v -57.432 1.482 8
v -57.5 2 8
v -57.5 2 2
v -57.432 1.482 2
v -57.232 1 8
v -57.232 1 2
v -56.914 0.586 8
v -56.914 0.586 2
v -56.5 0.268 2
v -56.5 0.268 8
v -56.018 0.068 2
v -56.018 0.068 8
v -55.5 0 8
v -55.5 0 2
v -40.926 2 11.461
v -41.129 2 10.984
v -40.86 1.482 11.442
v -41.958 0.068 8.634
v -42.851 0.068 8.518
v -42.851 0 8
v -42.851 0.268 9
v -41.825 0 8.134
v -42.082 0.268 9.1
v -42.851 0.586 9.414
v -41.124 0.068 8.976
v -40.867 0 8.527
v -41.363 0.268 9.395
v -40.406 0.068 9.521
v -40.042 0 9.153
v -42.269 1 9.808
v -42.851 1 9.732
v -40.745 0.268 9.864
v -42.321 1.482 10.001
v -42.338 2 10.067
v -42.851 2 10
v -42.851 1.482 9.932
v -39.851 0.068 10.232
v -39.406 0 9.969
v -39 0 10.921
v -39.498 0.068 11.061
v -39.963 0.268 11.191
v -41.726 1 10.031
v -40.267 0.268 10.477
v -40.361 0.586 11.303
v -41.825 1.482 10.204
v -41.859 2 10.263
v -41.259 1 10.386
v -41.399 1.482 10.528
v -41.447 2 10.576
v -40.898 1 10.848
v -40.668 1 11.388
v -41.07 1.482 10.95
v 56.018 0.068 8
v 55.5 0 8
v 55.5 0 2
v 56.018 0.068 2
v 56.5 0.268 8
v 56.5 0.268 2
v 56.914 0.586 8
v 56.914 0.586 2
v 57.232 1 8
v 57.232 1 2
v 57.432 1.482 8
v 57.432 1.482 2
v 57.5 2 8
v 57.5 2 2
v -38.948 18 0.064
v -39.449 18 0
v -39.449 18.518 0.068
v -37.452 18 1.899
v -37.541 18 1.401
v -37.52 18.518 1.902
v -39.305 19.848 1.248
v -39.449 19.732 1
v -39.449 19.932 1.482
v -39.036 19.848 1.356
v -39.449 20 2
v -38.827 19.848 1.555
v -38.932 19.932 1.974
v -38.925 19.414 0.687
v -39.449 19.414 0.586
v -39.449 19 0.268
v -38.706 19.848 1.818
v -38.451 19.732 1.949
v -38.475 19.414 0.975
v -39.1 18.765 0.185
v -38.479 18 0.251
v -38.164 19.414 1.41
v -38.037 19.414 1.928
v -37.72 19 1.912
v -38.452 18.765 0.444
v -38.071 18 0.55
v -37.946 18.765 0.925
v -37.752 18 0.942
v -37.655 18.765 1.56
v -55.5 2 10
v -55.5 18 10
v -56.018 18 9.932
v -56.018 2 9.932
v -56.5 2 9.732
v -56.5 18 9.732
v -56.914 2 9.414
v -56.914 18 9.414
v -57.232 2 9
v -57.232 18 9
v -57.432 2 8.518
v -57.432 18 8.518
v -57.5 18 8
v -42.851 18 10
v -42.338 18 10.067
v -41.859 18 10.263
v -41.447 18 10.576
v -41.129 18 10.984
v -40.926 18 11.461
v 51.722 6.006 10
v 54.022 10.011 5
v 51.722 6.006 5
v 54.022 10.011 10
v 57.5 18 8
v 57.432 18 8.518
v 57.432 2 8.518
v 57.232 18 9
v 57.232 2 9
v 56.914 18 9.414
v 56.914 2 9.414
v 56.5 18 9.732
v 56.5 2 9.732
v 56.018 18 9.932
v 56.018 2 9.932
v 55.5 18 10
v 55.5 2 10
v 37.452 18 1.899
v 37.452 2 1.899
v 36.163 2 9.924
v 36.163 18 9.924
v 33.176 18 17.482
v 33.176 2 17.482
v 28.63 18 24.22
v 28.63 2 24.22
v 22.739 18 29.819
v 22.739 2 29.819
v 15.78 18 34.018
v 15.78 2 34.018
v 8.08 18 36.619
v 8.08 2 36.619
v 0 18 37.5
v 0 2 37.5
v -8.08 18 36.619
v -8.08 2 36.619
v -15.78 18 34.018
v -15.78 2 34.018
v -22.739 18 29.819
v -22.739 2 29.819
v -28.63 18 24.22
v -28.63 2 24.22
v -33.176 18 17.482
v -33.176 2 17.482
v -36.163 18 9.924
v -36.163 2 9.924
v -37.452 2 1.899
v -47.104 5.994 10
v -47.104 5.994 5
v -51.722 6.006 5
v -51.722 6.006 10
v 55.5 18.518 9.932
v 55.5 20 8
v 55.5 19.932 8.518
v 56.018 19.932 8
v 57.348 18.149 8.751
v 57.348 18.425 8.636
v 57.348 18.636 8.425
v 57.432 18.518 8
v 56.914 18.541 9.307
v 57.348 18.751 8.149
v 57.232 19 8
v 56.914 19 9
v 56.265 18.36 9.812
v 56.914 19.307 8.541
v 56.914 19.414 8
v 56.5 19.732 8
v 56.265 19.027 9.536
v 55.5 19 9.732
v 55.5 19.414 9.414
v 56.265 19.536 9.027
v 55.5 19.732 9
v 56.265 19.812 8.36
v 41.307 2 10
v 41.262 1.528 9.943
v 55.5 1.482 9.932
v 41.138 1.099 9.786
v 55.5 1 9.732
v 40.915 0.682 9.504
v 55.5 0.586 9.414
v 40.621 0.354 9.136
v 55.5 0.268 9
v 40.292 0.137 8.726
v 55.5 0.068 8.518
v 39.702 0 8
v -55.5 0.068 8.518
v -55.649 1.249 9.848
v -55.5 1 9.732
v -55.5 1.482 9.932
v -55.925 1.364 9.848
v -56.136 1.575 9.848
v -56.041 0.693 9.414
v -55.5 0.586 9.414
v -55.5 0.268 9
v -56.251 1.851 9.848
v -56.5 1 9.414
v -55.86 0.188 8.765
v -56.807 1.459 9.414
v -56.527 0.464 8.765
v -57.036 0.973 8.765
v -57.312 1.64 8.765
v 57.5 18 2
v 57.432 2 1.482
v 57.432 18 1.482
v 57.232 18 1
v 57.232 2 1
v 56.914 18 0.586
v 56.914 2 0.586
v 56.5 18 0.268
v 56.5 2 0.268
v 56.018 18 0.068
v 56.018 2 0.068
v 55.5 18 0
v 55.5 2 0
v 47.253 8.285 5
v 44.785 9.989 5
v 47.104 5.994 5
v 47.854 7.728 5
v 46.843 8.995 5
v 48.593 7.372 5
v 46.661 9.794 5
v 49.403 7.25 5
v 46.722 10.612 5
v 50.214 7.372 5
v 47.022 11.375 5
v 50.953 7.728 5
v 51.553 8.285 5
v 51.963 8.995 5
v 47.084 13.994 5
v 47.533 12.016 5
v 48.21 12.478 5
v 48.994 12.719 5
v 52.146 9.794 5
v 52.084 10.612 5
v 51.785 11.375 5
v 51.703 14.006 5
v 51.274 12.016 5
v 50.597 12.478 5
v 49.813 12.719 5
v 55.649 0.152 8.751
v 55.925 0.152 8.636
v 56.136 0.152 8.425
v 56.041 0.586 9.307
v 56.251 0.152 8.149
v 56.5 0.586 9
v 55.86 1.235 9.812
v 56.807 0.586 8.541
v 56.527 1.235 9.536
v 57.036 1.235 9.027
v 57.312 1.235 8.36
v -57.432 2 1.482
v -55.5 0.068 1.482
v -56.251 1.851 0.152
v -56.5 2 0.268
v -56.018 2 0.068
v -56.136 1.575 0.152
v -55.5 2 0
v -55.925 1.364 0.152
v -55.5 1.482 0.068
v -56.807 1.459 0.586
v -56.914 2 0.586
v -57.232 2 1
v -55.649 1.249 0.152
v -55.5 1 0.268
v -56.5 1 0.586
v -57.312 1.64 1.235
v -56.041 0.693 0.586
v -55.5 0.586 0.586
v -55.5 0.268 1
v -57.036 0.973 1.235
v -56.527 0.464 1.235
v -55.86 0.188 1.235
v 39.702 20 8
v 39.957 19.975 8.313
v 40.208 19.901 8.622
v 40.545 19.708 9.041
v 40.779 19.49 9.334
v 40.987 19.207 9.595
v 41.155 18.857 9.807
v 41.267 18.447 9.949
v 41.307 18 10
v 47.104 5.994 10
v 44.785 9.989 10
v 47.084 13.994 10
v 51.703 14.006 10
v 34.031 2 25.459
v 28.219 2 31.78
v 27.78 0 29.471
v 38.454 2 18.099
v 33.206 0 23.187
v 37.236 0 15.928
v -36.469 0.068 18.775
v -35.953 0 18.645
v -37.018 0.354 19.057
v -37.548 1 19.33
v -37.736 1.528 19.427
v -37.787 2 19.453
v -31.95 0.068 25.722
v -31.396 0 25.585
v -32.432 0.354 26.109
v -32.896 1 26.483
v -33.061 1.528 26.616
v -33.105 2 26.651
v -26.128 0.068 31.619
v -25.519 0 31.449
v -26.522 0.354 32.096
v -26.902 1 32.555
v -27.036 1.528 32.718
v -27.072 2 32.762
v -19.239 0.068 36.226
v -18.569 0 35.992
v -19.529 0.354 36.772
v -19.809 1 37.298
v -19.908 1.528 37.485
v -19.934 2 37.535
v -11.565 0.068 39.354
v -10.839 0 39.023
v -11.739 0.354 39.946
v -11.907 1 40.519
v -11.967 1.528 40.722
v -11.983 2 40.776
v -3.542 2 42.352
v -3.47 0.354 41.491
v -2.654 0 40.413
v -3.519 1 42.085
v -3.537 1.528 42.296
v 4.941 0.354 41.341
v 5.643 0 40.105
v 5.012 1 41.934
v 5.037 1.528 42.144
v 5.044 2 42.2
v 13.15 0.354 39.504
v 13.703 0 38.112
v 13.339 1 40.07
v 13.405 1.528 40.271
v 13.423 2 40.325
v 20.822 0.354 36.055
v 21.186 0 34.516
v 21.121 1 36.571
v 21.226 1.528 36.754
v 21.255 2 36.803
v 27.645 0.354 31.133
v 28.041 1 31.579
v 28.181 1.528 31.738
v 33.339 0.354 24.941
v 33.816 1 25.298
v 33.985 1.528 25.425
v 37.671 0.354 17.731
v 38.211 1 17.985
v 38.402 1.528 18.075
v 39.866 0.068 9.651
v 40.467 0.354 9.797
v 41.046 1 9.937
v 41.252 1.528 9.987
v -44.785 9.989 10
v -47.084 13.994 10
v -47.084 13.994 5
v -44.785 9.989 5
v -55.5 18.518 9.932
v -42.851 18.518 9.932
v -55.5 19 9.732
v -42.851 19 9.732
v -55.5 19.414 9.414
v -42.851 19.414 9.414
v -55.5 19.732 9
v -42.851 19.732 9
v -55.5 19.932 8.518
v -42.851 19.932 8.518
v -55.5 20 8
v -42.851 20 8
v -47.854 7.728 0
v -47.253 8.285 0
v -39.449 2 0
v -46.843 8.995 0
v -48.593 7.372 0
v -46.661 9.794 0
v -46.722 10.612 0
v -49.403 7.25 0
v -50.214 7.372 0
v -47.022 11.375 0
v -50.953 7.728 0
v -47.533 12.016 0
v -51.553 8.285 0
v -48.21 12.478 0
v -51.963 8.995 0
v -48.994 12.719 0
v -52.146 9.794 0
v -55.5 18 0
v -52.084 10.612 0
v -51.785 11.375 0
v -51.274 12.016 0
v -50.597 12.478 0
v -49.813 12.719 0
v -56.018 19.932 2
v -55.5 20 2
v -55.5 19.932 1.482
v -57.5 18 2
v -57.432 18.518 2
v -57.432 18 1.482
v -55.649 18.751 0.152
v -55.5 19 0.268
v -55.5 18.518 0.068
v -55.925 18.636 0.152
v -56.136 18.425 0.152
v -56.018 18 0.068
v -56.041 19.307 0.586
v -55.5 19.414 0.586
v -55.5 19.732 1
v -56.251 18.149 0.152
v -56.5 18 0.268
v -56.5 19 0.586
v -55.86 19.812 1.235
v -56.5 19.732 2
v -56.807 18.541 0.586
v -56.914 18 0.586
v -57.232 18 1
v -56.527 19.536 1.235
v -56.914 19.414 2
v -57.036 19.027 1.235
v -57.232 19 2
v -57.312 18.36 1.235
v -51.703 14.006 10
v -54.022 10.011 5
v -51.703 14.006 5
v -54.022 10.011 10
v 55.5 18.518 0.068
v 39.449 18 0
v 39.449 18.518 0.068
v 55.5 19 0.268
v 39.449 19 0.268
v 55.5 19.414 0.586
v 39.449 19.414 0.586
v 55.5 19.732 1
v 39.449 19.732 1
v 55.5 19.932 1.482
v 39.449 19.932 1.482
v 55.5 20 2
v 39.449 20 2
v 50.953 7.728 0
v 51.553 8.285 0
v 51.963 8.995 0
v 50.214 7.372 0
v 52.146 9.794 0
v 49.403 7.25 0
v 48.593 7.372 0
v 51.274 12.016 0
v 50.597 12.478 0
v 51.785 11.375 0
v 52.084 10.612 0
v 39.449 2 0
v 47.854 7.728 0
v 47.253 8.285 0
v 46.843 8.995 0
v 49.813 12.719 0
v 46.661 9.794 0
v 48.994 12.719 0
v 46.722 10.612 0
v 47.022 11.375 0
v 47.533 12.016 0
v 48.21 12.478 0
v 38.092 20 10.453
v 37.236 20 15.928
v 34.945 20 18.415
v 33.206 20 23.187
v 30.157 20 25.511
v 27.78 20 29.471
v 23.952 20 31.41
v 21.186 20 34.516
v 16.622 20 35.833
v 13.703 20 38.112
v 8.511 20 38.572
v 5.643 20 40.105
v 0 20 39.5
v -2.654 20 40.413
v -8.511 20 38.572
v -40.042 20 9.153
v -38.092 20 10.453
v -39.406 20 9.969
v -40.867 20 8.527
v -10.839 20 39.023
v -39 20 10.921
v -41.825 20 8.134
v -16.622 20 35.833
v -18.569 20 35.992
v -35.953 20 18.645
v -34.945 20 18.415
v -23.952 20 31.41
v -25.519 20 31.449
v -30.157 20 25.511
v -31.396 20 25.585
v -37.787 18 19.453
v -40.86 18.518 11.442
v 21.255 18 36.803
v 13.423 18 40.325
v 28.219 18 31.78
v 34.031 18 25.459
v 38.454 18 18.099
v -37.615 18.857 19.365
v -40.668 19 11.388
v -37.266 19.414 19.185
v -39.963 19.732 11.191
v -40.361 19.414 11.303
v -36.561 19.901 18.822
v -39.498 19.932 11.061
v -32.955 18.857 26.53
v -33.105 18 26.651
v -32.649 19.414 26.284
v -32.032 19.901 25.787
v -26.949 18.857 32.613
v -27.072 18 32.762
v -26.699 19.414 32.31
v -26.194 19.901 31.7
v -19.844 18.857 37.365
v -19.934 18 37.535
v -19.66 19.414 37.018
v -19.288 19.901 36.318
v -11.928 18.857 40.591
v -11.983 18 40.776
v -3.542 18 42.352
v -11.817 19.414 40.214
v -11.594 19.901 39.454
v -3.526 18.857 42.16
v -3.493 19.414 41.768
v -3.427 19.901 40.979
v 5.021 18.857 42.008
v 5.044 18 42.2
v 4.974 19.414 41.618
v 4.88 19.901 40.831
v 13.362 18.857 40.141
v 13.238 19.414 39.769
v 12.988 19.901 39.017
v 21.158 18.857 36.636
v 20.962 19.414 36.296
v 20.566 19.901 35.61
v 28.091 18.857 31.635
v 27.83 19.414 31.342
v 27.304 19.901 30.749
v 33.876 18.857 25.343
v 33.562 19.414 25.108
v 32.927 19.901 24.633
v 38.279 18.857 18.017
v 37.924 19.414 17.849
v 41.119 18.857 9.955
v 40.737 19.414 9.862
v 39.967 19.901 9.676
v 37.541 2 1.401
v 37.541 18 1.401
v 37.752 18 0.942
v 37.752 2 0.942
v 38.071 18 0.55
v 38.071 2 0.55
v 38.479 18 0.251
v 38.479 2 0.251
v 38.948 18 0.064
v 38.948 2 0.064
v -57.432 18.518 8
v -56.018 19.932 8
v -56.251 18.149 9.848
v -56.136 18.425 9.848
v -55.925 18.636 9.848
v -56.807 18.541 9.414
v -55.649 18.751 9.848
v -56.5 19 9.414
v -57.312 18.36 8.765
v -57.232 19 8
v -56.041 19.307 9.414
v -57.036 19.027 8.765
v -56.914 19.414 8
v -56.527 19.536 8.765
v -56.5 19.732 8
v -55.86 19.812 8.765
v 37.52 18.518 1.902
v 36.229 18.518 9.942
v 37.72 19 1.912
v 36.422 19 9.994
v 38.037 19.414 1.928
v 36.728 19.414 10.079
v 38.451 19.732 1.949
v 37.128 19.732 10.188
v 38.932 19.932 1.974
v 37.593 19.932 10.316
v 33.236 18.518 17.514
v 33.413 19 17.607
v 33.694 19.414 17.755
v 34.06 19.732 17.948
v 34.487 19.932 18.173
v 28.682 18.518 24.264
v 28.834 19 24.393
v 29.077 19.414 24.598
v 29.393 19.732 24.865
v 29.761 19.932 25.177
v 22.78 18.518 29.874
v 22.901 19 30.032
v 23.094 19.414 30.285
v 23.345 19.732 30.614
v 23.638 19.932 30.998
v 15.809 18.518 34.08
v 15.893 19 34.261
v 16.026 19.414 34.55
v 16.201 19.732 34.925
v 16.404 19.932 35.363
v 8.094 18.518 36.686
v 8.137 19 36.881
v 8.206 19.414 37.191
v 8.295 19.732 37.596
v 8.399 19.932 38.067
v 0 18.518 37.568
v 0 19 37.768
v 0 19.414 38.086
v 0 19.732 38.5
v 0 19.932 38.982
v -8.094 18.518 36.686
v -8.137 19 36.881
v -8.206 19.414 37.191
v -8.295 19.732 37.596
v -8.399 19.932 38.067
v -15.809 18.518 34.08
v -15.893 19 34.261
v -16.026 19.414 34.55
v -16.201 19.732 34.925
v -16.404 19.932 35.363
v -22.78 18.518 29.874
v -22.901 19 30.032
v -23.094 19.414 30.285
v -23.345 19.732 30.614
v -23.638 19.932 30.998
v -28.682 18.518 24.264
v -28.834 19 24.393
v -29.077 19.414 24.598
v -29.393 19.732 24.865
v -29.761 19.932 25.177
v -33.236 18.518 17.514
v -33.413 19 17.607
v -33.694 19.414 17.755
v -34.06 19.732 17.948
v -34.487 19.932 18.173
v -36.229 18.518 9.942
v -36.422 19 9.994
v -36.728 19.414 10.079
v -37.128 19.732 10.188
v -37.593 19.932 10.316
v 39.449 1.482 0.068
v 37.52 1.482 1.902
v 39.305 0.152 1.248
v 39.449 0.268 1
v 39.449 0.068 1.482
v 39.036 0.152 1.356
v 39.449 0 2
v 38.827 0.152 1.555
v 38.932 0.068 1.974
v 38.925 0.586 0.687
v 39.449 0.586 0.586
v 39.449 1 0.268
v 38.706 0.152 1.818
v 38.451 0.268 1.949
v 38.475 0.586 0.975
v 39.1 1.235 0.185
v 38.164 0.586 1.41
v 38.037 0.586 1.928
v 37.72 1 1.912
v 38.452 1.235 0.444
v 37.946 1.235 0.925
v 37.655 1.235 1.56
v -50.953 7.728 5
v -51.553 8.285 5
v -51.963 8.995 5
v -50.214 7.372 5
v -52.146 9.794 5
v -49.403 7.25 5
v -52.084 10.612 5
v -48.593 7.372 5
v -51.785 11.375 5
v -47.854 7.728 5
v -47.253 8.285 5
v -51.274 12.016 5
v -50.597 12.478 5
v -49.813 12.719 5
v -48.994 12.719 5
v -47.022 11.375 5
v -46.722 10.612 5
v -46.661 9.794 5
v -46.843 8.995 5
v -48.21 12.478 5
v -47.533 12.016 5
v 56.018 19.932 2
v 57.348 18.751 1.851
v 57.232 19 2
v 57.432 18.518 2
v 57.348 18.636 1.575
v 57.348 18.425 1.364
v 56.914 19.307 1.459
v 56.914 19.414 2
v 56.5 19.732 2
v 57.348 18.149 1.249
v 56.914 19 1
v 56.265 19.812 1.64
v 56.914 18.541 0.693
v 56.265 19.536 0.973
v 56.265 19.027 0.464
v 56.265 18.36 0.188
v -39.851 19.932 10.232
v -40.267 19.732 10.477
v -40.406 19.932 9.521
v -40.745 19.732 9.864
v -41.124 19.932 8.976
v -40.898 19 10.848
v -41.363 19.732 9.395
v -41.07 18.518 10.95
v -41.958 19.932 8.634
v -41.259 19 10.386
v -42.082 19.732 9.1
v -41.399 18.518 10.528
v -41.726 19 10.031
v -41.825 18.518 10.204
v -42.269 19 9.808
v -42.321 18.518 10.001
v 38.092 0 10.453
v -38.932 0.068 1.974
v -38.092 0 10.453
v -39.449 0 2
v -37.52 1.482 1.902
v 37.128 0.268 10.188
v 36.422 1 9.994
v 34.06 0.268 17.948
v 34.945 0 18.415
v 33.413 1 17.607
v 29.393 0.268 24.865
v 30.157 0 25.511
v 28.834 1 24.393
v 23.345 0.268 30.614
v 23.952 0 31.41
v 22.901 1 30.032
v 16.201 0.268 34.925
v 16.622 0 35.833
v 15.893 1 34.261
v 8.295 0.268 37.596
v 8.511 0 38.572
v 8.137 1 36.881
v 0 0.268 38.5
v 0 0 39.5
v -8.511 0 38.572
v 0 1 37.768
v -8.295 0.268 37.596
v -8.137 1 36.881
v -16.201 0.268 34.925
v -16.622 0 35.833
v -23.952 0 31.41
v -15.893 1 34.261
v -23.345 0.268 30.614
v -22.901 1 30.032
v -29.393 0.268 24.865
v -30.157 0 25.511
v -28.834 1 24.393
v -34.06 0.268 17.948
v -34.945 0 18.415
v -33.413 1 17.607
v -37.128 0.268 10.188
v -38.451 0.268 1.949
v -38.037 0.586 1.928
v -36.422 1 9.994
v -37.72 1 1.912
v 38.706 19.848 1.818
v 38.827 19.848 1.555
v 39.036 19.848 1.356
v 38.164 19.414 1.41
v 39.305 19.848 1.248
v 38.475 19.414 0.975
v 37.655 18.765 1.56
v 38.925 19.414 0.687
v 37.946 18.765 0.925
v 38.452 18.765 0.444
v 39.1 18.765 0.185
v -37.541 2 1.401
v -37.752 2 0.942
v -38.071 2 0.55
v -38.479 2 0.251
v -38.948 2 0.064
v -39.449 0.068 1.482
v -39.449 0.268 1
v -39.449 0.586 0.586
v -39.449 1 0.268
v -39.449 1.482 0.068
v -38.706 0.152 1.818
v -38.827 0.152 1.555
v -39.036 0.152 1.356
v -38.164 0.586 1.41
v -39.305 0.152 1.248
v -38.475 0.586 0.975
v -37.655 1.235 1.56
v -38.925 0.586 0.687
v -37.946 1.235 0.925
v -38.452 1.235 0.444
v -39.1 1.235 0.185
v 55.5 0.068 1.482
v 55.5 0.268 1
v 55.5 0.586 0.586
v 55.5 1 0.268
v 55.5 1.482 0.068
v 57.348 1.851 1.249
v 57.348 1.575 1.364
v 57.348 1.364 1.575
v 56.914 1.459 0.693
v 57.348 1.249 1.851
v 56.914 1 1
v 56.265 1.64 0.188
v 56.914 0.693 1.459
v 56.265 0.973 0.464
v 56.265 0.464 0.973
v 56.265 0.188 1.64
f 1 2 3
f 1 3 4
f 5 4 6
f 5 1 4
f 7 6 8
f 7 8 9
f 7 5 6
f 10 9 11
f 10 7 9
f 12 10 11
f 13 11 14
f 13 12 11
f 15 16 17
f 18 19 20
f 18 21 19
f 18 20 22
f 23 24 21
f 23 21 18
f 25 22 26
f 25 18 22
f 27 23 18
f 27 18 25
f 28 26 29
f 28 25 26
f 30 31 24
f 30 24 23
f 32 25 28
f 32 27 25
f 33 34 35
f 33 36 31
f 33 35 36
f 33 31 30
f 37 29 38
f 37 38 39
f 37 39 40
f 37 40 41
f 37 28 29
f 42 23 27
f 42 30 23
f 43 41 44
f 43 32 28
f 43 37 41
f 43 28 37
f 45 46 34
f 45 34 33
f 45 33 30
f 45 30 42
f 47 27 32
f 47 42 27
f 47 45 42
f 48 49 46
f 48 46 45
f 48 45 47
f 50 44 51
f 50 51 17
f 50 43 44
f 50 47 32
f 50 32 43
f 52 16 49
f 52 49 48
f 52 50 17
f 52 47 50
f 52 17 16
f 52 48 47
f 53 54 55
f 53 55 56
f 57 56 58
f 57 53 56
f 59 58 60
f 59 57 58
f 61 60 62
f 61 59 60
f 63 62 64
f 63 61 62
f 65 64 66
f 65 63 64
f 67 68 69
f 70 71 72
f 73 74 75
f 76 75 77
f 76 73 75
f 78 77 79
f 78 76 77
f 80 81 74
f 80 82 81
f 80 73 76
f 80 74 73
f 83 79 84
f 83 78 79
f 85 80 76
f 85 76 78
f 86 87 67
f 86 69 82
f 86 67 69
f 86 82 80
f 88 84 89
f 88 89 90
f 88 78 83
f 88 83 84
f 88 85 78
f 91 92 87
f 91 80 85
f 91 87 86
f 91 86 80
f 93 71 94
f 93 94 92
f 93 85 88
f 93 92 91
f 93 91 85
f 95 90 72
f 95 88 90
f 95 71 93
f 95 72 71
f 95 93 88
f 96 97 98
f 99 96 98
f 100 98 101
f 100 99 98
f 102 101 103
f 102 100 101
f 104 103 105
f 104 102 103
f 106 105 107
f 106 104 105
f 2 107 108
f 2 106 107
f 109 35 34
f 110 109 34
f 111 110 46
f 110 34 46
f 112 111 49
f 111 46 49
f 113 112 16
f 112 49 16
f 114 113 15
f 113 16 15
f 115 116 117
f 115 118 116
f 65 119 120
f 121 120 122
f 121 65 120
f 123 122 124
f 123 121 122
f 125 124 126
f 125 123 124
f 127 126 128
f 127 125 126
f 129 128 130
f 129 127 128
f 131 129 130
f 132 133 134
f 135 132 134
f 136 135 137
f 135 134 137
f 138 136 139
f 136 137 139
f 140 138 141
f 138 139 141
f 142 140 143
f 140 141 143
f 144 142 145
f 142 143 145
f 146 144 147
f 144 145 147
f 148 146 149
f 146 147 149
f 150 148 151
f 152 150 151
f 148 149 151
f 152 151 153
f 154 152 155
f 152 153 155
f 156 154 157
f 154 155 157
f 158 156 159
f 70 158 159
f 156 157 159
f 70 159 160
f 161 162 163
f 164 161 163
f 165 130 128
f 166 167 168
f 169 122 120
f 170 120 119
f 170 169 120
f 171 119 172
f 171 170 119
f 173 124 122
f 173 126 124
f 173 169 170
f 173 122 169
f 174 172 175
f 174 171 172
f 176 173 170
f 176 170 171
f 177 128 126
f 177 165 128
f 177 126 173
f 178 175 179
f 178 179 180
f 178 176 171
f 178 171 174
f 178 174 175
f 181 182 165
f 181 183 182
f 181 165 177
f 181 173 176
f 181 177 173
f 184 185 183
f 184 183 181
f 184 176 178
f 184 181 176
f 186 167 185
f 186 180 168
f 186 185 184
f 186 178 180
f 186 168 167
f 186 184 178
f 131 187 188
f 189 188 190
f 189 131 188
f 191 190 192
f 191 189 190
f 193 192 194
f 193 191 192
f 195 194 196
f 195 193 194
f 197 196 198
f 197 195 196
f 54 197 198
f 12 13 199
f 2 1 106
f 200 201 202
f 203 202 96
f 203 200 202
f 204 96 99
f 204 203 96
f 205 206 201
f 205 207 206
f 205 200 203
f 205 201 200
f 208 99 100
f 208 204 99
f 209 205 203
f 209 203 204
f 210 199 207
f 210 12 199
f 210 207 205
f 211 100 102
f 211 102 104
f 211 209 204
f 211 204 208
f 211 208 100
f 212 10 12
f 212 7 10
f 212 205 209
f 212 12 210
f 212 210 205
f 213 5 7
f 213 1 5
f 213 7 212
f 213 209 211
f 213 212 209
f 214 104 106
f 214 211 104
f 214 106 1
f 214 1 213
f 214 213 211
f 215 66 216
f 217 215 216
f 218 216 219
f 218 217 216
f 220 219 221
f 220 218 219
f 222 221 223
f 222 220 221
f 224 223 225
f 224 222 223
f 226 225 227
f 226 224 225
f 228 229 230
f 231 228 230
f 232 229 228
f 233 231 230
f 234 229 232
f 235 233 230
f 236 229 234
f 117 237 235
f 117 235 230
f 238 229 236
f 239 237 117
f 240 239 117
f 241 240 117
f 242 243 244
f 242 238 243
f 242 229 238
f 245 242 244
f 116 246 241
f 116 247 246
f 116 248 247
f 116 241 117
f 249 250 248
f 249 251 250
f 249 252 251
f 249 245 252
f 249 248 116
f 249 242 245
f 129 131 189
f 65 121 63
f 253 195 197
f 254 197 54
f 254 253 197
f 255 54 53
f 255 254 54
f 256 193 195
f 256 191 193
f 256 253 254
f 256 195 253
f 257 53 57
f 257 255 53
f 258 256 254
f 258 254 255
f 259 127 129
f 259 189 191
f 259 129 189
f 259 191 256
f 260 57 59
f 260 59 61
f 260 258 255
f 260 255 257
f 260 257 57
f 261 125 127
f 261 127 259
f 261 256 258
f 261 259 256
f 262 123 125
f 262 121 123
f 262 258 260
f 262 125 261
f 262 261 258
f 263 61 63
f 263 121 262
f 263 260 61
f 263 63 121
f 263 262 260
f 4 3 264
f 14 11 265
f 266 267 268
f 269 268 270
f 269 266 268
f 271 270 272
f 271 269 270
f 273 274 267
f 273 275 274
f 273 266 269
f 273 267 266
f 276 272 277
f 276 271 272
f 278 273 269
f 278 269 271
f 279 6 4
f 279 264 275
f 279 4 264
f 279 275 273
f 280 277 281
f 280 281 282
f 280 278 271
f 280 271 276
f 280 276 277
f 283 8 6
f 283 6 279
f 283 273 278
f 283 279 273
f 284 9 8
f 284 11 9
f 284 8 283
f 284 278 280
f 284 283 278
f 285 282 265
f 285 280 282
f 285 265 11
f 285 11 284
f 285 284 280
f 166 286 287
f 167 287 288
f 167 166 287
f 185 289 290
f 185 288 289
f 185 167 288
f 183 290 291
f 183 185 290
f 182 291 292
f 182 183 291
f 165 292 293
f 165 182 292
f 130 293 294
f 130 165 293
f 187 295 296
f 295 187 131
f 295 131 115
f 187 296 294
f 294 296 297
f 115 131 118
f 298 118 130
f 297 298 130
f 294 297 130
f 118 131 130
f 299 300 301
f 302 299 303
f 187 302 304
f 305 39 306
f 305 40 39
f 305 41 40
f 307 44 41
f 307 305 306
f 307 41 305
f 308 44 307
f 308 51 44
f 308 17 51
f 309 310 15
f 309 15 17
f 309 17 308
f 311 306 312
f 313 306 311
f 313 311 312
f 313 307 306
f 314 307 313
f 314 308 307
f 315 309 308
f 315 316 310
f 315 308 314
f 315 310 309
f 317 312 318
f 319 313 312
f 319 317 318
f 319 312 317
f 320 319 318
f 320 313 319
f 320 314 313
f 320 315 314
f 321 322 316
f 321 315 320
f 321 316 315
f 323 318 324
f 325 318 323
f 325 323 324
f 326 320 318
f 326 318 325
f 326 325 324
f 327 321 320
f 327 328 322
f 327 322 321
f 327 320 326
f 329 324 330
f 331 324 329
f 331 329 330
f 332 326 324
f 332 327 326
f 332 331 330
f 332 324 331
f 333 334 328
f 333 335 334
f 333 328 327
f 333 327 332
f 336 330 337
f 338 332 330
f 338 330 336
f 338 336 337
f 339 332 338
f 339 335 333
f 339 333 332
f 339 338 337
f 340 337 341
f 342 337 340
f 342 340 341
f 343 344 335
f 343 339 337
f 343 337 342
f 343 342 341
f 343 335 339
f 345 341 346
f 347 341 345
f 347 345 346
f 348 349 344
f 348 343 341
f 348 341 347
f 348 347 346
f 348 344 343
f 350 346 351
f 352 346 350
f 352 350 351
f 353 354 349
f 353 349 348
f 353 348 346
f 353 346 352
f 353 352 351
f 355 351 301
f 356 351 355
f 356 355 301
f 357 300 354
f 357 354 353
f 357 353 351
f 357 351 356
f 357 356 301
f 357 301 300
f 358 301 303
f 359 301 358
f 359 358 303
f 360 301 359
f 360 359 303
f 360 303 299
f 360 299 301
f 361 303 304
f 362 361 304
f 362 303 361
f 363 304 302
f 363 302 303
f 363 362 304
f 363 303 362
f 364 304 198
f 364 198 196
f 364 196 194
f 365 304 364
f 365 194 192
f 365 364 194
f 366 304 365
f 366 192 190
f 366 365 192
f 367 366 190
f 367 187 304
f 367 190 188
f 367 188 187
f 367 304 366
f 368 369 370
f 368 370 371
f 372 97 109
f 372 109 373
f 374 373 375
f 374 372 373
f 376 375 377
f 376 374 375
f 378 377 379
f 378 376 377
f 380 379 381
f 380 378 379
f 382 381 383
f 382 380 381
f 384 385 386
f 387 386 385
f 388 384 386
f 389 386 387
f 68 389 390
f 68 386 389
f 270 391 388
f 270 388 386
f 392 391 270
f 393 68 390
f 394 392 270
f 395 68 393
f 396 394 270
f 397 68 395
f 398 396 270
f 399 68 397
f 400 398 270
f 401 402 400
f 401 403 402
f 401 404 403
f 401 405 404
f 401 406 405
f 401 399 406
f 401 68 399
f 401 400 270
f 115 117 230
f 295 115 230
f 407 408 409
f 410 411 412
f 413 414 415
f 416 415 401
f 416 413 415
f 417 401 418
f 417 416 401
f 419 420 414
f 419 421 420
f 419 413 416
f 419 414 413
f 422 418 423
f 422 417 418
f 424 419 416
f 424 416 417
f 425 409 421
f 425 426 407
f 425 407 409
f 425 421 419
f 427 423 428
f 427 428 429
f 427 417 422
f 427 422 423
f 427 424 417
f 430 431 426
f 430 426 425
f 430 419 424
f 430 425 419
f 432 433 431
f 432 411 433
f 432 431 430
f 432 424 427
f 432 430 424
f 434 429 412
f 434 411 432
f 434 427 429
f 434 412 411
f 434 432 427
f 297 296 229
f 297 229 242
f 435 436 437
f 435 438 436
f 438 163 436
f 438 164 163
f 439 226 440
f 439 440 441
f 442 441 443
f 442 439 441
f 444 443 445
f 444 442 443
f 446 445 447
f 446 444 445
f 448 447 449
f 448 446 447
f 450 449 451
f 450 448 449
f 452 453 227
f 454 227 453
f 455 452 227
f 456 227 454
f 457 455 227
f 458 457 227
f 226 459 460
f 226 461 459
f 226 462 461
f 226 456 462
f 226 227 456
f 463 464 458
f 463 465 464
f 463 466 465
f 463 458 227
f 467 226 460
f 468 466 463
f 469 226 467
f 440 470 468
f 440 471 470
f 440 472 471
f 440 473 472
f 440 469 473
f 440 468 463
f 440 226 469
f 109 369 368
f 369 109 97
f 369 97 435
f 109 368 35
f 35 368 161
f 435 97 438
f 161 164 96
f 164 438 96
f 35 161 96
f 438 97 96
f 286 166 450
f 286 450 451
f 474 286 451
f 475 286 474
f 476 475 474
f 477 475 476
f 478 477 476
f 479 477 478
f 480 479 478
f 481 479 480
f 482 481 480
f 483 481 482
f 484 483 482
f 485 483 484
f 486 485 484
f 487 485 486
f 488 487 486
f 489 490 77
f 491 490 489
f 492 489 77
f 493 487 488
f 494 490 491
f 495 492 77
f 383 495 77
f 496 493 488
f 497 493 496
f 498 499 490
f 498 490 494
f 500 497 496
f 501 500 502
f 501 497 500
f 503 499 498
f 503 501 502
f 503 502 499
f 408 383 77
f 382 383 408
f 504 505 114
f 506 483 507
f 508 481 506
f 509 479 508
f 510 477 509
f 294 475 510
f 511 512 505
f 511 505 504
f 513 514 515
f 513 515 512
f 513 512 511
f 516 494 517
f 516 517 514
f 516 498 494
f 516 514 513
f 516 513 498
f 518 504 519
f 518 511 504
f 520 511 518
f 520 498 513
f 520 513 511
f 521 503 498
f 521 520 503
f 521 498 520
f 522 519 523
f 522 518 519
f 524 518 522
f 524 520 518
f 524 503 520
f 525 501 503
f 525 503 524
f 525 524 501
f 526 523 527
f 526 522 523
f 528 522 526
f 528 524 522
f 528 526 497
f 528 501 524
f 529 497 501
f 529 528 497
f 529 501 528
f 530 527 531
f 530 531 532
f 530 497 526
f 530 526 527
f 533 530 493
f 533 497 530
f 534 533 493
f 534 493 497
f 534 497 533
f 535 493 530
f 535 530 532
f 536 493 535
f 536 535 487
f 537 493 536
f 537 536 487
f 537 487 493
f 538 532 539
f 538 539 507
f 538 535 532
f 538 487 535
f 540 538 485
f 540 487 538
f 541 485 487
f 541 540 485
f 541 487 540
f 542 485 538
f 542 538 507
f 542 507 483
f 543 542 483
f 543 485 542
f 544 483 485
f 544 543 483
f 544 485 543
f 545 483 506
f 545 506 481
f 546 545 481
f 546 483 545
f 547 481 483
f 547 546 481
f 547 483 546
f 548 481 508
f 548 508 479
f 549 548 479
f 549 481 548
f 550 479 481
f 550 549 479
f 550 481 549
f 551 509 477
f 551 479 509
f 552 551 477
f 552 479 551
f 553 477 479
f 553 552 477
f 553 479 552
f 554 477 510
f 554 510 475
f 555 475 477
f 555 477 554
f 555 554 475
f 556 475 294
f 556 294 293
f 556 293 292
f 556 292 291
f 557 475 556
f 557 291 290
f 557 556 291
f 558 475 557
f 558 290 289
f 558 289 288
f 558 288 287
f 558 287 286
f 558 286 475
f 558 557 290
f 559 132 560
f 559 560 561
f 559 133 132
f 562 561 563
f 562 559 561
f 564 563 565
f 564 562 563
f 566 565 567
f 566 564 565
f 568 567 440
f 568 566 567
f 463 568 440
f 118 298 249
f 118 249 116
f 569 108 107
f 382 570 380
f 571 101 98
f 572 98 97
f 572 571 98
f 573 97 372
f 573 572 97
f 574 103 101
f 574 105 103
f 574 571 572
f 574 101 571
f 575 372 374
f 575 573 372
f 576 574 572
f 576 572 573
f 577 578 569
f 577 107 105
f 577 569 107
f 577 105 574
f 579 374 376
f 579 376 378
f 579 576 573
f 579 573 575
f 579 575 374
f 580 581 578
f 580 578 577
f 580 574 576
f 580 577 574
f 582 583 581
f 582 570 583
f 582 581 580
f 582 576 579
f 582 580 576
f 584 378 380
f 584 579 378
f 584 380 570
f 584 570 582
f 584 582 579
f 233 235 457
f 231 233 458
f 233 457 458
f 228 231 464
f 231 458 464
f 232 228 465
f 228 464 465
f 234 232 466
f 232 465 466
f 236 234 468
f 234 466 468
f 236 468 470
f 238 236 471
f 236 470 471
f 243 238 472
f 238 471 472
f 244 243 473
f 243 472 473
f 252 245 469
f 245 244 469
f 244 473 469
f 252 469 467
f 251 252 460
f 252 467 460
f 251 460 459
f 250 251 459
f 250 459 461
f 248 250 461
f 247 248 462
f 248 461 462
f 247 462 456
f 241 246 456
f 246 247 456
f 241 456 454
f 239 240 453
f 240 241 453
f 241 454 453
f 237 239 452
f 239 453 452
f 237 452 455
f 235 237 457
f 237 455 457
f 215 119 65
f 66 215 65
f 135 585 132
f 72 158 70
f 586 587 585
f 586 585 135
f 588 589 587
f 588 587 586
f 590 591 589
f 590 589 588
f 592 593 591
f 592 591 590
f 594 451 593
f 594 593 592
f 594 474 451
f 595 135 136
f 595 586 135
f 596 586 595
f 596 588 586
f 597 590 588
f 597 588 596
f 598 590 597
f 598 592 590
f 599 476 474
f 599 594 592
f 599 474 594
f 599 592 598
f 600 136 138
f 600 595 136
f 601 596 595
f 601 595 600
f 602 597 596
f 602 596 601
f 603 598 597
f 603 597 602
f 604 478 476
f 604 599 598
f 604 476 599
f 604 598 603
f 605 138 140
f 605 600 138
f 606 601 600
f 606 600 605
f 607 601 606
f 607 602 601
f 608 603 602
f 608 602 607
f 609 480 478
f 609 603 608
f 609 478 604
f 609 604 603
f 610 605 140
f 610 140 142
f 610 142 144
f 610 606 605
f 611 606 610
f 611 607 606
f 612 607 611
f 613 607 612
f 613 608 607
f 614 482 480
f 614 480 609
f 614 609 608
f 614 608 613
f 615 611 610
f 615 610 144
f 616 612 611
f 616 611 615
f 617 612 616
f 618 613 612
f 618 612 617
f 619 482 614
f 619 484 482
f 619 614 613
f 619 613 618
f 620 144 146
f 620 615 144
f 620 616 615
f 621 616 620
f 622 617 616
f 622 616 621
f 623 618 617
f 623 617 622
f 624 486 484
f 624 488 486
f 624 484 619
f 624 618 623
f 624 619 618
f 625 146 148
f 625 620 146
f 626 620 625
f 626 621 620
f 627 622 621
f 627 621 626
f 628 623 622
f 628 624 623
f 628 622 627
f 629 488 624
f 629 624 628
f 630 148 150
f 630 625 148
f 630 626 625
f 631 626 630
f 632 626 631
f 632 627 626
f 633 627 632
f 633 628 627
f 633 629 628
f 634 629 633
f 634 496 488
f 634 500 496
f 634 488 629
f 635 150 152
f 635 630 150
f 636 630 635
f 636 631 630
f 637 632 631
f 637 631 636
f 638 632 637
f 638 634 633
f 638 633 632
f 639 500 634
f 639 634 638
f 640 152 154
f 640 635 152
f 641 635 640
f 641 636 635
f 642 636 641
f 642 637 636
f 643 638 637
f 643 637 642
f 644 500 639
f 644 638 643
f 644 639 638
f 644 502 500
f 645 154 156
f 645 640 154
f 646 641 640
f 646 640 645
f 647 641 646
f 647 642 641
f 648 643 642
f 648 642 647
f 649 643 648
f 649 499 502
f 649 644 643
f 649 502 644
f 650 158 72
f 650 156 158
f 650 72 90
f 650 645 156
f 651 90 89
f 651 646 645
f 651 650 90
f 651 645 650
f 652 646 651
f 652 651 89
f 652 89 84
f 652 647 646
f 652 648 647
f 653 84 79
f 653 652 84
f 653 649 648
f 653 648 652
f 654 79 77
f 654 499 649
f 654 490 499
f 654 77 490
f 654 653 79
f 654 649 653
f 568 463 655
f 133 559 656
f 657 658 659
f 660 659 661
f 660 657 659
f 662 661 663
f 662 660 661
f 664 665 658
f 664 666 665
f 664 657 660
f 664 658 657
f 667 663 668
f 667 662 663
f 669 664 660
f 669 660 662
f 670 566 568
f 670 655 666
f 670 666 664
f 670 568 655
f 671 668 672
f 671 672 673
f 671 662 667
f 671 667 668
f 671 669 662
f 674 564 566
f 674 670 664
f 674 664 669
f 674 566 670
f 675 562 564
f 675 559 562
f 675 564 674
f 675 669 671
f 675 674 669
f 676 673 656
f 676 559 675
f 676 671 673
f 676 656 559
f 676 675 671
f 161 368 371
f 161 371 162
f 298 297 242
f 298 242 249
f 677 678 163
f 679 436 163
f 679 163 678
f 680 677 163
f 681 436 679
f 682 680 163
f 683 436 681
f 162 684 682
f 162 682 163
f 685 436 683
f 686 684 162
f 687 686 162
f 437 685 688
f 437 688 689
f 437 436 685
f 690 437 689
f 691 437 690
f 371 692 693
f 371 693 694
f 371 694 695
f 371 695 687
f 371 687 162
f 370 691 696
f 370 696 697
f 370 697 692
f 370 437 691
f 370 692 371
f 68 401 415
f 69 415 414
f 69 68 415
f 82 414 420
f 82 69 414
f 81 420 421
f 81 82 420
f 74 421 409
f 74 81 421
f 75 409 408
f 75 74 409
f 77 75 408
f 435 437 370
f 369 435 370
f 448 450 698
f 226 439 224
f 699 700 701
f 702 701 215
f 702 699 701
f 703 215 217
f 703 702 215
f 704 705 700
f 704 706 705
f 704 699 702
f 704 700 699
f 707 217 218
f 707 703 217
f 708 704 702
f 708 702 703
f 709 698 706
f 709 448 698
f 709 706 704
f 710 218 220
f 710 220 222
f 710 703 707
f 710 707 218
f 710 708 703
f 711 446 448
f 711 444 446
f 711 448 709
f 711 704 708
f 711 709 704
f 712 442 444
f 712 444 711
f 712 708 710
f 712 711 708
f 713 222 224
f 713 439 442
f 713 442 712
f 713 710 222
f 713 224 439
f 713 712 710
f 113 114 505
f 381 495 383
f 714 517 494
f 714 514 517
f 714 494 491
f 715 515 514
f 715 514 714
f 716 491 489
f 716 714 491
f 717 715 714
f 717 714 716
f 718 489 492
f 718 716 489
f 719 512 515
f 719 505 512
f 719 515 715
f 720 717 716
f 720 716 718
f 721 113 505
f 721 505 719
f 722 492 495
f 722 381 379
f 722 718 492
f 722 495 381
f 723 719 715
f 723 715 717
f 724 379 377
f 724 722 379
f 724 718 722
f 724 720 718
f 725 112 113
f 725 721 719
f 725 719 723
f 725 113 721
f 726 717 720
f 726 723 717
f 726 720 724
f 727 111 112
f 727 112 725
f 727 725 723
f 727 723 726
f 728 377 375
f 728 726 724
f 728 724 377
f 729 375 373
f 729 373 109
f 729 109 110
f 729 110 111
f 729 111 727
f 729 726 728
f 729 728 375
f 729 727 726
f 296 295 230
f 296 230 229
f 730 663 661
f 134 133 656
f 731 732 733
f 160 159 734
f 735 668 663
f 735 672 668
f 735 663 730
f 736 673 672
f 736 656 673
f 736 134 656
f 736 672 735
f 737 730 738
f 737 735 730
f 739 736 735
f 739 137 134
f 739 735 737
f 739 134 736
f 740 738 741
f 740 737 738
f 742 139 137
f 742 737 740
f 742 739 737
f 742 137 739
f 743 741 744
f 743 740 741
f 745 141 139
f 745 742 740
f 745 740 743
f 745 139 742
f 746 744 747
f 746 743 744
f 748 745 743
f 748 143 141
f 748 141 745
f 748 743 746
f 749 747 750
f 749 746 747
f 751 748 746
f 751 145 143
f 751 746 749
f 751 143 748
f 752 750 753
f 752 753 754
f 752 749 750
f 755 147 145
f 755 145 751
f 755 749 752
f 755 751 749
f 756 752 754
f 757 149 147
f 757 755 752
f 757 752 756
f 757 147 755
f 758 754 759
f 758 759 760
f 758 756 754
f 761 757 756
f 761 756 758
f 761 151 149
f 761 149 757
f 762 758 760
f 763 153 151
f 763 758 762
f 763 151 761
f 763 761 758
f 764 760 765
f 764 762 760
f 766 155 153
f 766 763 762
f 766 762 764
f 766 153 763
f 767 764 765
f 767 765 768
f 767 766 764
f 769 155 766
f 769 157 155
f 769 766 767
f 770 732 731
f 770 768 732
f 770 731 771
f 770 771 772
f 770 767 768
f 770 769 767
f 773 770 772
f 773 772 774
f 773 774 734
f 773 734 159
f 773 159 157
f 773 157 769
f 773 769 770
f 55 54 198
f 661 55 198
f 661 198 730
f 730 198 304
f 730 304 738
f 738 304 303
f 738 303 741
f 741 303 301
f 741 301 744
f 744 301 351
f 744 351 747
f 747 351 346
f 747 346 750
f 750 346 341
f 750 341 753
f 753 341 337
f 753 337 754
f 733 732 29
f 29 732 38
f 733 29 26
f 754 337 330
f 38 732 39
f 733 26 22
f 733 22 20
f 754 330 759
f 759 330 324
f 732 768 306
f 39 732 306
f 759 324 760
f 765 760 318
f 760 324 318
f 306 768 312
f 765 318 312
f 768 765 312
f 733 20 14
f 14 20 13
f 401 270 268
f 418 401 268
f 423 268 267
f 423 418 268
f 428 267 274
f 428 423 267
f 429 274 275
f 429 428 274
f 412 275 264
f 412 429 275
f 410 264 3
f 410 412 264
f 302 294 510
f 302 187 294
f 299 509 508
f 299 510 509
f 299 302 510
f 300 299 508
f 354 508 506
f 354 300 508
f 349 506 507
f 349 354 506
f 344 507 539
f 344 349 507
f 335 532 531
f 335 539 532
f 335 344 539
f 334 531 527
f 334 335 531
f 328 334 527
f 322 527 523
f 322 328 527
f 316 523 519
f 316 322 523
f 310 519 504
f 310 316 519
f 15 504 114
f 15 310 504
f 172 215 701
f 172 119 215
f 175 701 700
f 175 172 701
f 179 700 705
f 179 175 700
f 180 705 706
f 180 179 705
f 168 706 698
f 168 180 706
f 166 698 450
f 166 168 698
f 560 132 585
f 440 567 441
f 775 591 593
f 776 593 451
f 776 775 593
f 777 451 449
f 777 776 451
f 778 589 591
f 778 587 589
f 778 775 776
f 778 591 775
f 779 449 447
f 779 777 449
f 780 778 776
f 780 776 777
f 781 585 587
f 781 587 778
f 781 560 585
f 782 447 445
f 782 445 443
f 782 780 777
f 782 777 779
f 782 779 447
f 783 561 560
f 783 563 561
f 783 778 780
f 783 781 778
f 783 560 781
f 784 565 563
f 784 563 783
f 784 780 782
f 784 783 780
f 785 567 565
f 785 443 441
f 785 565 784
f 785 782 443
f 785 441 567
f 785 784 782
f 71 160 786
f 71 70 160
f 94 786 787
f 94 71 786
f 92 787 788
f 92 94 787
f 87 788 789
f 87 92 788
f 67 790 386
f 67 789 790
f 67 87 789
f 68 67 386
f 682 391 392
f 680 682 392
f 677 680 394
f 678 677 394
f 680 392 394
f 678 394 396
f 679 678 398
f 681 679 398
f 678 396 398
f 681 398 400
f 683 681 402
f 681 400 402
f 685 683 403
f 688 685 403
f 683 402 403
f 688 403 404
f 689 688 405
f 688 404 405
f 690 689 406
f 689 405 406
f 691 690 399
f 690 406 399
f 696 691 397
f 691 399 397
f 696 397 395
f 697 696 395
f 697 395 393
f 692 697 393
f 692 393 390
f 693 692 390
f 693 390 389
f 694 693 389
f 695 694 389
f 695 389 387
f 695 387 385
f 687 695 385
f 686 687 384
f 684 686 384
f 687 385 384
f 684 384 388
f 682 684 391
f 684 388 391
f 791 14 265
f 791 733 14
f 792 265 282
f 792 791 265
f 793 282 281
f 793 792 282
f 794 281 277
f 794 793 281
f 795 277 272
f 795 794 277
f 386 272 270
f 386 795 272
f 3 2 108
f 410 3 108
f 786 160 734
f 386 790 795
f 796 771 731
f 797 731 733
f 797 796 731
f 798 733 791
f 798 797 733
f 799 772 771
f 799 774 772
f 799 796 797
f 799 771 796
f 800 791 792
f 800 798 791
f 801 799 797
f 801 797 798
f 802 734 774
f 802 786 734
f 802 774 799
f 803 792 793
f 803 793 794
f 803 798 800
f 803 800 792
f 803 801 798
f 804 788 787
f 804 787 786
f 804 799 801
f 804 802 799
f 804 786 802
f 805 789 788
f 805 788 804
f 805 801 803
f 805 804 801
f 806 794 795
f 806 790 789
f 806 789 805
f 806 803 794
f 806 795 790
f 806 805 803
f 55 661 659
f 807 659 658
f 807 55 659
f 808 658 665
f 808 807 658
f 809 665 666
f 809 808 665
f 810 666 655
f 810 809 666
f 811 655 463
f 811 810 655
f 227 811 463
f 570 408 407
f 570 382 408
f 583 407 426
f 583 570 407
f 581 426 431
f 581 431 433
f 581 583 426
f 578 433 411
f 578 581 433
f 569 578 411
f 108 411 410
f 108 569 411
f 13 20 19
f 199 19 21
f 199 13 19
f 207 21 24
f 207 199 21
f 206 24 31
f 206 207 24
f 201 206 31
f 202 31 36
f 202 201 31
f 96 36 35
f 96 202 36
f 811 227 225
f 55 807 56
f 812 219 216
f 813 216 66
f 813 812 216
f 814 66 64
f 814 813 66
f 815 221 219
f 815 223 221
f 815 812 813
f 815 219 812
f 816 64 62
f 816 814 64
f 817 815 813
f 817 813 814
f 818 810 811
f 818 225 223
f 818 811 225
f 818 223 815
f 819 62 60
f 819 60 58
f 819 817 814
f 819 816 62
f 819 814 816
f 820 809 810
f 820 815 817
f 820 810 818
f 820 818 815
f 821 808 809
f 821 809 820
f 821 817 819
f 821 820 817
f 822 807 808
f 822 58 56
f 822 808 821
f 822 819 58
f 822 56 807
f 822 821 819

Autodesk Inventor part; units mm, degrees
ref_plane "XZ Plane" through (0, 0, 0) normal (0, 1, 0) x (-1, 0, 0)
ref_plane "XY Plane" through (0, 0, 0) normal (0, 0, 1) x (1, 0, 0)
sketch "Sketch1" plane through (0, 0, 0) normal (0, 1, 0) x (-1, 0, 0)
  circle A0 centre (0, 0) radius 42.5
  dimension "d0" = 85
extrude "Extrusion1" add sketch "Sketch1" along normal blind 20
shell "Shell1" thickness 5 removed faces 2 at (10.6049, 20, 7.3037) at (10.6049, 0, 7.3037)
sketch "Sketch2" plane through (0, 20, 0) normal (0, 1, 0) x (1, 0, 0)
  line L0 (-62.0625, 51.3519) -> (57.6609, 51.3519)
  line L1 (57.6609, 51.3519) -> (57.6609, 0)
  line L2 (57.6609, 0) -> (-62.0625, 0)
  line L3 (-62.0625, 0) -> (-62.0625, 51.3519)
  point P0 (0, 0)
extrude "Extrusion2" cut sketch "Sketch2" against normal through all
ref_plane "Work Plane1" through (-42.5, 0, 0) normal (1, 0, 0) x (0, 1, 0)
sketch "Sketch3" plane through (-42.5, 0, 0) normal (1, 0, 0) x (0, 1, 0)
  line L0 (0, 0) -> (0, 42.5) projected
  line L1 (0, 0) -> (20, 0)
  line L2 (20, 0) -> (20, 10)
  line L3 (20, 10) -> (0, 10)
  line L4 (0, 10) -> (0, 0)
  point P0 (0, 10)
  dimension "d7" = 20
  dimension "d8" = 10
extrude "Extrusion3" add sketch "Sketch3" along normal blind 2 and the other way blind 15
mirror "Mirror1" about plane through (0, 0, 0) normal (1, 0, 0) of "Extrusion3"
sketch "Sketch6" plane through (-57.5, 20, 10) normal (0, 0, 1) x (1, 0, 0)
  line L0 (10.3965, -14.0055) -> (5.7777, -13.9945)
  line L1 (5.7777, -13.9945) -> (3.4778, -9.9891)
  line L2 (3.4778, -9.9891) -> (5.7967, -5.9945)
  line L3 (5.7967, -5.9945) -> (10.4155, -6.0055)
  line L4 (10.4155, -6.0055) -> (12.7154, -10.0109)
  line L5 (12.7154, -10.0109) -> (10.3965, -14.0055)
  line L6 (0, -20) -> (0, 0) projected
  line L7 (0, 0) -> (16.1932, 0) projected
  point P0 (57.5, -20)
  point P1 (8.0966, -10)
  point P2 (0, -10)
  point P3 (8.0966, 0)
  dimension "d27" = 8
extrude "Extrusion4" cut sketch "Sketch6" against normal blind 5
sketch "Sketch7" plane through (-57.5, 20, 5) normal (0, 0, 1) x (1, 0, 0)
  line L0 (0, -20) -> (0, 0) projected
  line L1 (0, 0) -> (16.1932, 0) projected
  point P0 (57.5, -20)
  point P1 (8.0966, -10)
  point P2 (0, -10)
  point P3 (8.0966, 0)
hole "Hole3" at (-49.4034, 10, 5) direction (0, 0, -1) diameter 5.5 end through all clearance for "Hex Head Bolt" size "M5" standard "Ansi Metric M Profile"
mirror "Mirror3" about plane through (0, 0, 0) normal (1, 0, 0) of "Extrusion4", "Hole3"
fillet "Fillet1" radius 2 23 edges at (-57.5, 0, 5) (-57.5, 20, 5) (-41.3068, 10, 10) (-49.4034, 0, 10) (-57.5, 10, 10) (-49.4034, 20, 10) (0, 20, 42.5) (0, 20, 37.5) (0, 0, 42.5) (-47.5, 20, 0) (47.5, 20, 0) (-57.5, 10, 0) (-47.5, 0, 0) (47.5, 0, 0) (0, 0, 37.5) (49.4034, 20, 10) (57.5, 10, 10) (49.4034, 0, 10) (57.5, 0, 5) (57.5, 20, 5) (57.5, 10, 0) (-37.5, 10, 0) (37.5, 10, 0)
properties part number "ur5e_cable_tube_bottom_75mm"
